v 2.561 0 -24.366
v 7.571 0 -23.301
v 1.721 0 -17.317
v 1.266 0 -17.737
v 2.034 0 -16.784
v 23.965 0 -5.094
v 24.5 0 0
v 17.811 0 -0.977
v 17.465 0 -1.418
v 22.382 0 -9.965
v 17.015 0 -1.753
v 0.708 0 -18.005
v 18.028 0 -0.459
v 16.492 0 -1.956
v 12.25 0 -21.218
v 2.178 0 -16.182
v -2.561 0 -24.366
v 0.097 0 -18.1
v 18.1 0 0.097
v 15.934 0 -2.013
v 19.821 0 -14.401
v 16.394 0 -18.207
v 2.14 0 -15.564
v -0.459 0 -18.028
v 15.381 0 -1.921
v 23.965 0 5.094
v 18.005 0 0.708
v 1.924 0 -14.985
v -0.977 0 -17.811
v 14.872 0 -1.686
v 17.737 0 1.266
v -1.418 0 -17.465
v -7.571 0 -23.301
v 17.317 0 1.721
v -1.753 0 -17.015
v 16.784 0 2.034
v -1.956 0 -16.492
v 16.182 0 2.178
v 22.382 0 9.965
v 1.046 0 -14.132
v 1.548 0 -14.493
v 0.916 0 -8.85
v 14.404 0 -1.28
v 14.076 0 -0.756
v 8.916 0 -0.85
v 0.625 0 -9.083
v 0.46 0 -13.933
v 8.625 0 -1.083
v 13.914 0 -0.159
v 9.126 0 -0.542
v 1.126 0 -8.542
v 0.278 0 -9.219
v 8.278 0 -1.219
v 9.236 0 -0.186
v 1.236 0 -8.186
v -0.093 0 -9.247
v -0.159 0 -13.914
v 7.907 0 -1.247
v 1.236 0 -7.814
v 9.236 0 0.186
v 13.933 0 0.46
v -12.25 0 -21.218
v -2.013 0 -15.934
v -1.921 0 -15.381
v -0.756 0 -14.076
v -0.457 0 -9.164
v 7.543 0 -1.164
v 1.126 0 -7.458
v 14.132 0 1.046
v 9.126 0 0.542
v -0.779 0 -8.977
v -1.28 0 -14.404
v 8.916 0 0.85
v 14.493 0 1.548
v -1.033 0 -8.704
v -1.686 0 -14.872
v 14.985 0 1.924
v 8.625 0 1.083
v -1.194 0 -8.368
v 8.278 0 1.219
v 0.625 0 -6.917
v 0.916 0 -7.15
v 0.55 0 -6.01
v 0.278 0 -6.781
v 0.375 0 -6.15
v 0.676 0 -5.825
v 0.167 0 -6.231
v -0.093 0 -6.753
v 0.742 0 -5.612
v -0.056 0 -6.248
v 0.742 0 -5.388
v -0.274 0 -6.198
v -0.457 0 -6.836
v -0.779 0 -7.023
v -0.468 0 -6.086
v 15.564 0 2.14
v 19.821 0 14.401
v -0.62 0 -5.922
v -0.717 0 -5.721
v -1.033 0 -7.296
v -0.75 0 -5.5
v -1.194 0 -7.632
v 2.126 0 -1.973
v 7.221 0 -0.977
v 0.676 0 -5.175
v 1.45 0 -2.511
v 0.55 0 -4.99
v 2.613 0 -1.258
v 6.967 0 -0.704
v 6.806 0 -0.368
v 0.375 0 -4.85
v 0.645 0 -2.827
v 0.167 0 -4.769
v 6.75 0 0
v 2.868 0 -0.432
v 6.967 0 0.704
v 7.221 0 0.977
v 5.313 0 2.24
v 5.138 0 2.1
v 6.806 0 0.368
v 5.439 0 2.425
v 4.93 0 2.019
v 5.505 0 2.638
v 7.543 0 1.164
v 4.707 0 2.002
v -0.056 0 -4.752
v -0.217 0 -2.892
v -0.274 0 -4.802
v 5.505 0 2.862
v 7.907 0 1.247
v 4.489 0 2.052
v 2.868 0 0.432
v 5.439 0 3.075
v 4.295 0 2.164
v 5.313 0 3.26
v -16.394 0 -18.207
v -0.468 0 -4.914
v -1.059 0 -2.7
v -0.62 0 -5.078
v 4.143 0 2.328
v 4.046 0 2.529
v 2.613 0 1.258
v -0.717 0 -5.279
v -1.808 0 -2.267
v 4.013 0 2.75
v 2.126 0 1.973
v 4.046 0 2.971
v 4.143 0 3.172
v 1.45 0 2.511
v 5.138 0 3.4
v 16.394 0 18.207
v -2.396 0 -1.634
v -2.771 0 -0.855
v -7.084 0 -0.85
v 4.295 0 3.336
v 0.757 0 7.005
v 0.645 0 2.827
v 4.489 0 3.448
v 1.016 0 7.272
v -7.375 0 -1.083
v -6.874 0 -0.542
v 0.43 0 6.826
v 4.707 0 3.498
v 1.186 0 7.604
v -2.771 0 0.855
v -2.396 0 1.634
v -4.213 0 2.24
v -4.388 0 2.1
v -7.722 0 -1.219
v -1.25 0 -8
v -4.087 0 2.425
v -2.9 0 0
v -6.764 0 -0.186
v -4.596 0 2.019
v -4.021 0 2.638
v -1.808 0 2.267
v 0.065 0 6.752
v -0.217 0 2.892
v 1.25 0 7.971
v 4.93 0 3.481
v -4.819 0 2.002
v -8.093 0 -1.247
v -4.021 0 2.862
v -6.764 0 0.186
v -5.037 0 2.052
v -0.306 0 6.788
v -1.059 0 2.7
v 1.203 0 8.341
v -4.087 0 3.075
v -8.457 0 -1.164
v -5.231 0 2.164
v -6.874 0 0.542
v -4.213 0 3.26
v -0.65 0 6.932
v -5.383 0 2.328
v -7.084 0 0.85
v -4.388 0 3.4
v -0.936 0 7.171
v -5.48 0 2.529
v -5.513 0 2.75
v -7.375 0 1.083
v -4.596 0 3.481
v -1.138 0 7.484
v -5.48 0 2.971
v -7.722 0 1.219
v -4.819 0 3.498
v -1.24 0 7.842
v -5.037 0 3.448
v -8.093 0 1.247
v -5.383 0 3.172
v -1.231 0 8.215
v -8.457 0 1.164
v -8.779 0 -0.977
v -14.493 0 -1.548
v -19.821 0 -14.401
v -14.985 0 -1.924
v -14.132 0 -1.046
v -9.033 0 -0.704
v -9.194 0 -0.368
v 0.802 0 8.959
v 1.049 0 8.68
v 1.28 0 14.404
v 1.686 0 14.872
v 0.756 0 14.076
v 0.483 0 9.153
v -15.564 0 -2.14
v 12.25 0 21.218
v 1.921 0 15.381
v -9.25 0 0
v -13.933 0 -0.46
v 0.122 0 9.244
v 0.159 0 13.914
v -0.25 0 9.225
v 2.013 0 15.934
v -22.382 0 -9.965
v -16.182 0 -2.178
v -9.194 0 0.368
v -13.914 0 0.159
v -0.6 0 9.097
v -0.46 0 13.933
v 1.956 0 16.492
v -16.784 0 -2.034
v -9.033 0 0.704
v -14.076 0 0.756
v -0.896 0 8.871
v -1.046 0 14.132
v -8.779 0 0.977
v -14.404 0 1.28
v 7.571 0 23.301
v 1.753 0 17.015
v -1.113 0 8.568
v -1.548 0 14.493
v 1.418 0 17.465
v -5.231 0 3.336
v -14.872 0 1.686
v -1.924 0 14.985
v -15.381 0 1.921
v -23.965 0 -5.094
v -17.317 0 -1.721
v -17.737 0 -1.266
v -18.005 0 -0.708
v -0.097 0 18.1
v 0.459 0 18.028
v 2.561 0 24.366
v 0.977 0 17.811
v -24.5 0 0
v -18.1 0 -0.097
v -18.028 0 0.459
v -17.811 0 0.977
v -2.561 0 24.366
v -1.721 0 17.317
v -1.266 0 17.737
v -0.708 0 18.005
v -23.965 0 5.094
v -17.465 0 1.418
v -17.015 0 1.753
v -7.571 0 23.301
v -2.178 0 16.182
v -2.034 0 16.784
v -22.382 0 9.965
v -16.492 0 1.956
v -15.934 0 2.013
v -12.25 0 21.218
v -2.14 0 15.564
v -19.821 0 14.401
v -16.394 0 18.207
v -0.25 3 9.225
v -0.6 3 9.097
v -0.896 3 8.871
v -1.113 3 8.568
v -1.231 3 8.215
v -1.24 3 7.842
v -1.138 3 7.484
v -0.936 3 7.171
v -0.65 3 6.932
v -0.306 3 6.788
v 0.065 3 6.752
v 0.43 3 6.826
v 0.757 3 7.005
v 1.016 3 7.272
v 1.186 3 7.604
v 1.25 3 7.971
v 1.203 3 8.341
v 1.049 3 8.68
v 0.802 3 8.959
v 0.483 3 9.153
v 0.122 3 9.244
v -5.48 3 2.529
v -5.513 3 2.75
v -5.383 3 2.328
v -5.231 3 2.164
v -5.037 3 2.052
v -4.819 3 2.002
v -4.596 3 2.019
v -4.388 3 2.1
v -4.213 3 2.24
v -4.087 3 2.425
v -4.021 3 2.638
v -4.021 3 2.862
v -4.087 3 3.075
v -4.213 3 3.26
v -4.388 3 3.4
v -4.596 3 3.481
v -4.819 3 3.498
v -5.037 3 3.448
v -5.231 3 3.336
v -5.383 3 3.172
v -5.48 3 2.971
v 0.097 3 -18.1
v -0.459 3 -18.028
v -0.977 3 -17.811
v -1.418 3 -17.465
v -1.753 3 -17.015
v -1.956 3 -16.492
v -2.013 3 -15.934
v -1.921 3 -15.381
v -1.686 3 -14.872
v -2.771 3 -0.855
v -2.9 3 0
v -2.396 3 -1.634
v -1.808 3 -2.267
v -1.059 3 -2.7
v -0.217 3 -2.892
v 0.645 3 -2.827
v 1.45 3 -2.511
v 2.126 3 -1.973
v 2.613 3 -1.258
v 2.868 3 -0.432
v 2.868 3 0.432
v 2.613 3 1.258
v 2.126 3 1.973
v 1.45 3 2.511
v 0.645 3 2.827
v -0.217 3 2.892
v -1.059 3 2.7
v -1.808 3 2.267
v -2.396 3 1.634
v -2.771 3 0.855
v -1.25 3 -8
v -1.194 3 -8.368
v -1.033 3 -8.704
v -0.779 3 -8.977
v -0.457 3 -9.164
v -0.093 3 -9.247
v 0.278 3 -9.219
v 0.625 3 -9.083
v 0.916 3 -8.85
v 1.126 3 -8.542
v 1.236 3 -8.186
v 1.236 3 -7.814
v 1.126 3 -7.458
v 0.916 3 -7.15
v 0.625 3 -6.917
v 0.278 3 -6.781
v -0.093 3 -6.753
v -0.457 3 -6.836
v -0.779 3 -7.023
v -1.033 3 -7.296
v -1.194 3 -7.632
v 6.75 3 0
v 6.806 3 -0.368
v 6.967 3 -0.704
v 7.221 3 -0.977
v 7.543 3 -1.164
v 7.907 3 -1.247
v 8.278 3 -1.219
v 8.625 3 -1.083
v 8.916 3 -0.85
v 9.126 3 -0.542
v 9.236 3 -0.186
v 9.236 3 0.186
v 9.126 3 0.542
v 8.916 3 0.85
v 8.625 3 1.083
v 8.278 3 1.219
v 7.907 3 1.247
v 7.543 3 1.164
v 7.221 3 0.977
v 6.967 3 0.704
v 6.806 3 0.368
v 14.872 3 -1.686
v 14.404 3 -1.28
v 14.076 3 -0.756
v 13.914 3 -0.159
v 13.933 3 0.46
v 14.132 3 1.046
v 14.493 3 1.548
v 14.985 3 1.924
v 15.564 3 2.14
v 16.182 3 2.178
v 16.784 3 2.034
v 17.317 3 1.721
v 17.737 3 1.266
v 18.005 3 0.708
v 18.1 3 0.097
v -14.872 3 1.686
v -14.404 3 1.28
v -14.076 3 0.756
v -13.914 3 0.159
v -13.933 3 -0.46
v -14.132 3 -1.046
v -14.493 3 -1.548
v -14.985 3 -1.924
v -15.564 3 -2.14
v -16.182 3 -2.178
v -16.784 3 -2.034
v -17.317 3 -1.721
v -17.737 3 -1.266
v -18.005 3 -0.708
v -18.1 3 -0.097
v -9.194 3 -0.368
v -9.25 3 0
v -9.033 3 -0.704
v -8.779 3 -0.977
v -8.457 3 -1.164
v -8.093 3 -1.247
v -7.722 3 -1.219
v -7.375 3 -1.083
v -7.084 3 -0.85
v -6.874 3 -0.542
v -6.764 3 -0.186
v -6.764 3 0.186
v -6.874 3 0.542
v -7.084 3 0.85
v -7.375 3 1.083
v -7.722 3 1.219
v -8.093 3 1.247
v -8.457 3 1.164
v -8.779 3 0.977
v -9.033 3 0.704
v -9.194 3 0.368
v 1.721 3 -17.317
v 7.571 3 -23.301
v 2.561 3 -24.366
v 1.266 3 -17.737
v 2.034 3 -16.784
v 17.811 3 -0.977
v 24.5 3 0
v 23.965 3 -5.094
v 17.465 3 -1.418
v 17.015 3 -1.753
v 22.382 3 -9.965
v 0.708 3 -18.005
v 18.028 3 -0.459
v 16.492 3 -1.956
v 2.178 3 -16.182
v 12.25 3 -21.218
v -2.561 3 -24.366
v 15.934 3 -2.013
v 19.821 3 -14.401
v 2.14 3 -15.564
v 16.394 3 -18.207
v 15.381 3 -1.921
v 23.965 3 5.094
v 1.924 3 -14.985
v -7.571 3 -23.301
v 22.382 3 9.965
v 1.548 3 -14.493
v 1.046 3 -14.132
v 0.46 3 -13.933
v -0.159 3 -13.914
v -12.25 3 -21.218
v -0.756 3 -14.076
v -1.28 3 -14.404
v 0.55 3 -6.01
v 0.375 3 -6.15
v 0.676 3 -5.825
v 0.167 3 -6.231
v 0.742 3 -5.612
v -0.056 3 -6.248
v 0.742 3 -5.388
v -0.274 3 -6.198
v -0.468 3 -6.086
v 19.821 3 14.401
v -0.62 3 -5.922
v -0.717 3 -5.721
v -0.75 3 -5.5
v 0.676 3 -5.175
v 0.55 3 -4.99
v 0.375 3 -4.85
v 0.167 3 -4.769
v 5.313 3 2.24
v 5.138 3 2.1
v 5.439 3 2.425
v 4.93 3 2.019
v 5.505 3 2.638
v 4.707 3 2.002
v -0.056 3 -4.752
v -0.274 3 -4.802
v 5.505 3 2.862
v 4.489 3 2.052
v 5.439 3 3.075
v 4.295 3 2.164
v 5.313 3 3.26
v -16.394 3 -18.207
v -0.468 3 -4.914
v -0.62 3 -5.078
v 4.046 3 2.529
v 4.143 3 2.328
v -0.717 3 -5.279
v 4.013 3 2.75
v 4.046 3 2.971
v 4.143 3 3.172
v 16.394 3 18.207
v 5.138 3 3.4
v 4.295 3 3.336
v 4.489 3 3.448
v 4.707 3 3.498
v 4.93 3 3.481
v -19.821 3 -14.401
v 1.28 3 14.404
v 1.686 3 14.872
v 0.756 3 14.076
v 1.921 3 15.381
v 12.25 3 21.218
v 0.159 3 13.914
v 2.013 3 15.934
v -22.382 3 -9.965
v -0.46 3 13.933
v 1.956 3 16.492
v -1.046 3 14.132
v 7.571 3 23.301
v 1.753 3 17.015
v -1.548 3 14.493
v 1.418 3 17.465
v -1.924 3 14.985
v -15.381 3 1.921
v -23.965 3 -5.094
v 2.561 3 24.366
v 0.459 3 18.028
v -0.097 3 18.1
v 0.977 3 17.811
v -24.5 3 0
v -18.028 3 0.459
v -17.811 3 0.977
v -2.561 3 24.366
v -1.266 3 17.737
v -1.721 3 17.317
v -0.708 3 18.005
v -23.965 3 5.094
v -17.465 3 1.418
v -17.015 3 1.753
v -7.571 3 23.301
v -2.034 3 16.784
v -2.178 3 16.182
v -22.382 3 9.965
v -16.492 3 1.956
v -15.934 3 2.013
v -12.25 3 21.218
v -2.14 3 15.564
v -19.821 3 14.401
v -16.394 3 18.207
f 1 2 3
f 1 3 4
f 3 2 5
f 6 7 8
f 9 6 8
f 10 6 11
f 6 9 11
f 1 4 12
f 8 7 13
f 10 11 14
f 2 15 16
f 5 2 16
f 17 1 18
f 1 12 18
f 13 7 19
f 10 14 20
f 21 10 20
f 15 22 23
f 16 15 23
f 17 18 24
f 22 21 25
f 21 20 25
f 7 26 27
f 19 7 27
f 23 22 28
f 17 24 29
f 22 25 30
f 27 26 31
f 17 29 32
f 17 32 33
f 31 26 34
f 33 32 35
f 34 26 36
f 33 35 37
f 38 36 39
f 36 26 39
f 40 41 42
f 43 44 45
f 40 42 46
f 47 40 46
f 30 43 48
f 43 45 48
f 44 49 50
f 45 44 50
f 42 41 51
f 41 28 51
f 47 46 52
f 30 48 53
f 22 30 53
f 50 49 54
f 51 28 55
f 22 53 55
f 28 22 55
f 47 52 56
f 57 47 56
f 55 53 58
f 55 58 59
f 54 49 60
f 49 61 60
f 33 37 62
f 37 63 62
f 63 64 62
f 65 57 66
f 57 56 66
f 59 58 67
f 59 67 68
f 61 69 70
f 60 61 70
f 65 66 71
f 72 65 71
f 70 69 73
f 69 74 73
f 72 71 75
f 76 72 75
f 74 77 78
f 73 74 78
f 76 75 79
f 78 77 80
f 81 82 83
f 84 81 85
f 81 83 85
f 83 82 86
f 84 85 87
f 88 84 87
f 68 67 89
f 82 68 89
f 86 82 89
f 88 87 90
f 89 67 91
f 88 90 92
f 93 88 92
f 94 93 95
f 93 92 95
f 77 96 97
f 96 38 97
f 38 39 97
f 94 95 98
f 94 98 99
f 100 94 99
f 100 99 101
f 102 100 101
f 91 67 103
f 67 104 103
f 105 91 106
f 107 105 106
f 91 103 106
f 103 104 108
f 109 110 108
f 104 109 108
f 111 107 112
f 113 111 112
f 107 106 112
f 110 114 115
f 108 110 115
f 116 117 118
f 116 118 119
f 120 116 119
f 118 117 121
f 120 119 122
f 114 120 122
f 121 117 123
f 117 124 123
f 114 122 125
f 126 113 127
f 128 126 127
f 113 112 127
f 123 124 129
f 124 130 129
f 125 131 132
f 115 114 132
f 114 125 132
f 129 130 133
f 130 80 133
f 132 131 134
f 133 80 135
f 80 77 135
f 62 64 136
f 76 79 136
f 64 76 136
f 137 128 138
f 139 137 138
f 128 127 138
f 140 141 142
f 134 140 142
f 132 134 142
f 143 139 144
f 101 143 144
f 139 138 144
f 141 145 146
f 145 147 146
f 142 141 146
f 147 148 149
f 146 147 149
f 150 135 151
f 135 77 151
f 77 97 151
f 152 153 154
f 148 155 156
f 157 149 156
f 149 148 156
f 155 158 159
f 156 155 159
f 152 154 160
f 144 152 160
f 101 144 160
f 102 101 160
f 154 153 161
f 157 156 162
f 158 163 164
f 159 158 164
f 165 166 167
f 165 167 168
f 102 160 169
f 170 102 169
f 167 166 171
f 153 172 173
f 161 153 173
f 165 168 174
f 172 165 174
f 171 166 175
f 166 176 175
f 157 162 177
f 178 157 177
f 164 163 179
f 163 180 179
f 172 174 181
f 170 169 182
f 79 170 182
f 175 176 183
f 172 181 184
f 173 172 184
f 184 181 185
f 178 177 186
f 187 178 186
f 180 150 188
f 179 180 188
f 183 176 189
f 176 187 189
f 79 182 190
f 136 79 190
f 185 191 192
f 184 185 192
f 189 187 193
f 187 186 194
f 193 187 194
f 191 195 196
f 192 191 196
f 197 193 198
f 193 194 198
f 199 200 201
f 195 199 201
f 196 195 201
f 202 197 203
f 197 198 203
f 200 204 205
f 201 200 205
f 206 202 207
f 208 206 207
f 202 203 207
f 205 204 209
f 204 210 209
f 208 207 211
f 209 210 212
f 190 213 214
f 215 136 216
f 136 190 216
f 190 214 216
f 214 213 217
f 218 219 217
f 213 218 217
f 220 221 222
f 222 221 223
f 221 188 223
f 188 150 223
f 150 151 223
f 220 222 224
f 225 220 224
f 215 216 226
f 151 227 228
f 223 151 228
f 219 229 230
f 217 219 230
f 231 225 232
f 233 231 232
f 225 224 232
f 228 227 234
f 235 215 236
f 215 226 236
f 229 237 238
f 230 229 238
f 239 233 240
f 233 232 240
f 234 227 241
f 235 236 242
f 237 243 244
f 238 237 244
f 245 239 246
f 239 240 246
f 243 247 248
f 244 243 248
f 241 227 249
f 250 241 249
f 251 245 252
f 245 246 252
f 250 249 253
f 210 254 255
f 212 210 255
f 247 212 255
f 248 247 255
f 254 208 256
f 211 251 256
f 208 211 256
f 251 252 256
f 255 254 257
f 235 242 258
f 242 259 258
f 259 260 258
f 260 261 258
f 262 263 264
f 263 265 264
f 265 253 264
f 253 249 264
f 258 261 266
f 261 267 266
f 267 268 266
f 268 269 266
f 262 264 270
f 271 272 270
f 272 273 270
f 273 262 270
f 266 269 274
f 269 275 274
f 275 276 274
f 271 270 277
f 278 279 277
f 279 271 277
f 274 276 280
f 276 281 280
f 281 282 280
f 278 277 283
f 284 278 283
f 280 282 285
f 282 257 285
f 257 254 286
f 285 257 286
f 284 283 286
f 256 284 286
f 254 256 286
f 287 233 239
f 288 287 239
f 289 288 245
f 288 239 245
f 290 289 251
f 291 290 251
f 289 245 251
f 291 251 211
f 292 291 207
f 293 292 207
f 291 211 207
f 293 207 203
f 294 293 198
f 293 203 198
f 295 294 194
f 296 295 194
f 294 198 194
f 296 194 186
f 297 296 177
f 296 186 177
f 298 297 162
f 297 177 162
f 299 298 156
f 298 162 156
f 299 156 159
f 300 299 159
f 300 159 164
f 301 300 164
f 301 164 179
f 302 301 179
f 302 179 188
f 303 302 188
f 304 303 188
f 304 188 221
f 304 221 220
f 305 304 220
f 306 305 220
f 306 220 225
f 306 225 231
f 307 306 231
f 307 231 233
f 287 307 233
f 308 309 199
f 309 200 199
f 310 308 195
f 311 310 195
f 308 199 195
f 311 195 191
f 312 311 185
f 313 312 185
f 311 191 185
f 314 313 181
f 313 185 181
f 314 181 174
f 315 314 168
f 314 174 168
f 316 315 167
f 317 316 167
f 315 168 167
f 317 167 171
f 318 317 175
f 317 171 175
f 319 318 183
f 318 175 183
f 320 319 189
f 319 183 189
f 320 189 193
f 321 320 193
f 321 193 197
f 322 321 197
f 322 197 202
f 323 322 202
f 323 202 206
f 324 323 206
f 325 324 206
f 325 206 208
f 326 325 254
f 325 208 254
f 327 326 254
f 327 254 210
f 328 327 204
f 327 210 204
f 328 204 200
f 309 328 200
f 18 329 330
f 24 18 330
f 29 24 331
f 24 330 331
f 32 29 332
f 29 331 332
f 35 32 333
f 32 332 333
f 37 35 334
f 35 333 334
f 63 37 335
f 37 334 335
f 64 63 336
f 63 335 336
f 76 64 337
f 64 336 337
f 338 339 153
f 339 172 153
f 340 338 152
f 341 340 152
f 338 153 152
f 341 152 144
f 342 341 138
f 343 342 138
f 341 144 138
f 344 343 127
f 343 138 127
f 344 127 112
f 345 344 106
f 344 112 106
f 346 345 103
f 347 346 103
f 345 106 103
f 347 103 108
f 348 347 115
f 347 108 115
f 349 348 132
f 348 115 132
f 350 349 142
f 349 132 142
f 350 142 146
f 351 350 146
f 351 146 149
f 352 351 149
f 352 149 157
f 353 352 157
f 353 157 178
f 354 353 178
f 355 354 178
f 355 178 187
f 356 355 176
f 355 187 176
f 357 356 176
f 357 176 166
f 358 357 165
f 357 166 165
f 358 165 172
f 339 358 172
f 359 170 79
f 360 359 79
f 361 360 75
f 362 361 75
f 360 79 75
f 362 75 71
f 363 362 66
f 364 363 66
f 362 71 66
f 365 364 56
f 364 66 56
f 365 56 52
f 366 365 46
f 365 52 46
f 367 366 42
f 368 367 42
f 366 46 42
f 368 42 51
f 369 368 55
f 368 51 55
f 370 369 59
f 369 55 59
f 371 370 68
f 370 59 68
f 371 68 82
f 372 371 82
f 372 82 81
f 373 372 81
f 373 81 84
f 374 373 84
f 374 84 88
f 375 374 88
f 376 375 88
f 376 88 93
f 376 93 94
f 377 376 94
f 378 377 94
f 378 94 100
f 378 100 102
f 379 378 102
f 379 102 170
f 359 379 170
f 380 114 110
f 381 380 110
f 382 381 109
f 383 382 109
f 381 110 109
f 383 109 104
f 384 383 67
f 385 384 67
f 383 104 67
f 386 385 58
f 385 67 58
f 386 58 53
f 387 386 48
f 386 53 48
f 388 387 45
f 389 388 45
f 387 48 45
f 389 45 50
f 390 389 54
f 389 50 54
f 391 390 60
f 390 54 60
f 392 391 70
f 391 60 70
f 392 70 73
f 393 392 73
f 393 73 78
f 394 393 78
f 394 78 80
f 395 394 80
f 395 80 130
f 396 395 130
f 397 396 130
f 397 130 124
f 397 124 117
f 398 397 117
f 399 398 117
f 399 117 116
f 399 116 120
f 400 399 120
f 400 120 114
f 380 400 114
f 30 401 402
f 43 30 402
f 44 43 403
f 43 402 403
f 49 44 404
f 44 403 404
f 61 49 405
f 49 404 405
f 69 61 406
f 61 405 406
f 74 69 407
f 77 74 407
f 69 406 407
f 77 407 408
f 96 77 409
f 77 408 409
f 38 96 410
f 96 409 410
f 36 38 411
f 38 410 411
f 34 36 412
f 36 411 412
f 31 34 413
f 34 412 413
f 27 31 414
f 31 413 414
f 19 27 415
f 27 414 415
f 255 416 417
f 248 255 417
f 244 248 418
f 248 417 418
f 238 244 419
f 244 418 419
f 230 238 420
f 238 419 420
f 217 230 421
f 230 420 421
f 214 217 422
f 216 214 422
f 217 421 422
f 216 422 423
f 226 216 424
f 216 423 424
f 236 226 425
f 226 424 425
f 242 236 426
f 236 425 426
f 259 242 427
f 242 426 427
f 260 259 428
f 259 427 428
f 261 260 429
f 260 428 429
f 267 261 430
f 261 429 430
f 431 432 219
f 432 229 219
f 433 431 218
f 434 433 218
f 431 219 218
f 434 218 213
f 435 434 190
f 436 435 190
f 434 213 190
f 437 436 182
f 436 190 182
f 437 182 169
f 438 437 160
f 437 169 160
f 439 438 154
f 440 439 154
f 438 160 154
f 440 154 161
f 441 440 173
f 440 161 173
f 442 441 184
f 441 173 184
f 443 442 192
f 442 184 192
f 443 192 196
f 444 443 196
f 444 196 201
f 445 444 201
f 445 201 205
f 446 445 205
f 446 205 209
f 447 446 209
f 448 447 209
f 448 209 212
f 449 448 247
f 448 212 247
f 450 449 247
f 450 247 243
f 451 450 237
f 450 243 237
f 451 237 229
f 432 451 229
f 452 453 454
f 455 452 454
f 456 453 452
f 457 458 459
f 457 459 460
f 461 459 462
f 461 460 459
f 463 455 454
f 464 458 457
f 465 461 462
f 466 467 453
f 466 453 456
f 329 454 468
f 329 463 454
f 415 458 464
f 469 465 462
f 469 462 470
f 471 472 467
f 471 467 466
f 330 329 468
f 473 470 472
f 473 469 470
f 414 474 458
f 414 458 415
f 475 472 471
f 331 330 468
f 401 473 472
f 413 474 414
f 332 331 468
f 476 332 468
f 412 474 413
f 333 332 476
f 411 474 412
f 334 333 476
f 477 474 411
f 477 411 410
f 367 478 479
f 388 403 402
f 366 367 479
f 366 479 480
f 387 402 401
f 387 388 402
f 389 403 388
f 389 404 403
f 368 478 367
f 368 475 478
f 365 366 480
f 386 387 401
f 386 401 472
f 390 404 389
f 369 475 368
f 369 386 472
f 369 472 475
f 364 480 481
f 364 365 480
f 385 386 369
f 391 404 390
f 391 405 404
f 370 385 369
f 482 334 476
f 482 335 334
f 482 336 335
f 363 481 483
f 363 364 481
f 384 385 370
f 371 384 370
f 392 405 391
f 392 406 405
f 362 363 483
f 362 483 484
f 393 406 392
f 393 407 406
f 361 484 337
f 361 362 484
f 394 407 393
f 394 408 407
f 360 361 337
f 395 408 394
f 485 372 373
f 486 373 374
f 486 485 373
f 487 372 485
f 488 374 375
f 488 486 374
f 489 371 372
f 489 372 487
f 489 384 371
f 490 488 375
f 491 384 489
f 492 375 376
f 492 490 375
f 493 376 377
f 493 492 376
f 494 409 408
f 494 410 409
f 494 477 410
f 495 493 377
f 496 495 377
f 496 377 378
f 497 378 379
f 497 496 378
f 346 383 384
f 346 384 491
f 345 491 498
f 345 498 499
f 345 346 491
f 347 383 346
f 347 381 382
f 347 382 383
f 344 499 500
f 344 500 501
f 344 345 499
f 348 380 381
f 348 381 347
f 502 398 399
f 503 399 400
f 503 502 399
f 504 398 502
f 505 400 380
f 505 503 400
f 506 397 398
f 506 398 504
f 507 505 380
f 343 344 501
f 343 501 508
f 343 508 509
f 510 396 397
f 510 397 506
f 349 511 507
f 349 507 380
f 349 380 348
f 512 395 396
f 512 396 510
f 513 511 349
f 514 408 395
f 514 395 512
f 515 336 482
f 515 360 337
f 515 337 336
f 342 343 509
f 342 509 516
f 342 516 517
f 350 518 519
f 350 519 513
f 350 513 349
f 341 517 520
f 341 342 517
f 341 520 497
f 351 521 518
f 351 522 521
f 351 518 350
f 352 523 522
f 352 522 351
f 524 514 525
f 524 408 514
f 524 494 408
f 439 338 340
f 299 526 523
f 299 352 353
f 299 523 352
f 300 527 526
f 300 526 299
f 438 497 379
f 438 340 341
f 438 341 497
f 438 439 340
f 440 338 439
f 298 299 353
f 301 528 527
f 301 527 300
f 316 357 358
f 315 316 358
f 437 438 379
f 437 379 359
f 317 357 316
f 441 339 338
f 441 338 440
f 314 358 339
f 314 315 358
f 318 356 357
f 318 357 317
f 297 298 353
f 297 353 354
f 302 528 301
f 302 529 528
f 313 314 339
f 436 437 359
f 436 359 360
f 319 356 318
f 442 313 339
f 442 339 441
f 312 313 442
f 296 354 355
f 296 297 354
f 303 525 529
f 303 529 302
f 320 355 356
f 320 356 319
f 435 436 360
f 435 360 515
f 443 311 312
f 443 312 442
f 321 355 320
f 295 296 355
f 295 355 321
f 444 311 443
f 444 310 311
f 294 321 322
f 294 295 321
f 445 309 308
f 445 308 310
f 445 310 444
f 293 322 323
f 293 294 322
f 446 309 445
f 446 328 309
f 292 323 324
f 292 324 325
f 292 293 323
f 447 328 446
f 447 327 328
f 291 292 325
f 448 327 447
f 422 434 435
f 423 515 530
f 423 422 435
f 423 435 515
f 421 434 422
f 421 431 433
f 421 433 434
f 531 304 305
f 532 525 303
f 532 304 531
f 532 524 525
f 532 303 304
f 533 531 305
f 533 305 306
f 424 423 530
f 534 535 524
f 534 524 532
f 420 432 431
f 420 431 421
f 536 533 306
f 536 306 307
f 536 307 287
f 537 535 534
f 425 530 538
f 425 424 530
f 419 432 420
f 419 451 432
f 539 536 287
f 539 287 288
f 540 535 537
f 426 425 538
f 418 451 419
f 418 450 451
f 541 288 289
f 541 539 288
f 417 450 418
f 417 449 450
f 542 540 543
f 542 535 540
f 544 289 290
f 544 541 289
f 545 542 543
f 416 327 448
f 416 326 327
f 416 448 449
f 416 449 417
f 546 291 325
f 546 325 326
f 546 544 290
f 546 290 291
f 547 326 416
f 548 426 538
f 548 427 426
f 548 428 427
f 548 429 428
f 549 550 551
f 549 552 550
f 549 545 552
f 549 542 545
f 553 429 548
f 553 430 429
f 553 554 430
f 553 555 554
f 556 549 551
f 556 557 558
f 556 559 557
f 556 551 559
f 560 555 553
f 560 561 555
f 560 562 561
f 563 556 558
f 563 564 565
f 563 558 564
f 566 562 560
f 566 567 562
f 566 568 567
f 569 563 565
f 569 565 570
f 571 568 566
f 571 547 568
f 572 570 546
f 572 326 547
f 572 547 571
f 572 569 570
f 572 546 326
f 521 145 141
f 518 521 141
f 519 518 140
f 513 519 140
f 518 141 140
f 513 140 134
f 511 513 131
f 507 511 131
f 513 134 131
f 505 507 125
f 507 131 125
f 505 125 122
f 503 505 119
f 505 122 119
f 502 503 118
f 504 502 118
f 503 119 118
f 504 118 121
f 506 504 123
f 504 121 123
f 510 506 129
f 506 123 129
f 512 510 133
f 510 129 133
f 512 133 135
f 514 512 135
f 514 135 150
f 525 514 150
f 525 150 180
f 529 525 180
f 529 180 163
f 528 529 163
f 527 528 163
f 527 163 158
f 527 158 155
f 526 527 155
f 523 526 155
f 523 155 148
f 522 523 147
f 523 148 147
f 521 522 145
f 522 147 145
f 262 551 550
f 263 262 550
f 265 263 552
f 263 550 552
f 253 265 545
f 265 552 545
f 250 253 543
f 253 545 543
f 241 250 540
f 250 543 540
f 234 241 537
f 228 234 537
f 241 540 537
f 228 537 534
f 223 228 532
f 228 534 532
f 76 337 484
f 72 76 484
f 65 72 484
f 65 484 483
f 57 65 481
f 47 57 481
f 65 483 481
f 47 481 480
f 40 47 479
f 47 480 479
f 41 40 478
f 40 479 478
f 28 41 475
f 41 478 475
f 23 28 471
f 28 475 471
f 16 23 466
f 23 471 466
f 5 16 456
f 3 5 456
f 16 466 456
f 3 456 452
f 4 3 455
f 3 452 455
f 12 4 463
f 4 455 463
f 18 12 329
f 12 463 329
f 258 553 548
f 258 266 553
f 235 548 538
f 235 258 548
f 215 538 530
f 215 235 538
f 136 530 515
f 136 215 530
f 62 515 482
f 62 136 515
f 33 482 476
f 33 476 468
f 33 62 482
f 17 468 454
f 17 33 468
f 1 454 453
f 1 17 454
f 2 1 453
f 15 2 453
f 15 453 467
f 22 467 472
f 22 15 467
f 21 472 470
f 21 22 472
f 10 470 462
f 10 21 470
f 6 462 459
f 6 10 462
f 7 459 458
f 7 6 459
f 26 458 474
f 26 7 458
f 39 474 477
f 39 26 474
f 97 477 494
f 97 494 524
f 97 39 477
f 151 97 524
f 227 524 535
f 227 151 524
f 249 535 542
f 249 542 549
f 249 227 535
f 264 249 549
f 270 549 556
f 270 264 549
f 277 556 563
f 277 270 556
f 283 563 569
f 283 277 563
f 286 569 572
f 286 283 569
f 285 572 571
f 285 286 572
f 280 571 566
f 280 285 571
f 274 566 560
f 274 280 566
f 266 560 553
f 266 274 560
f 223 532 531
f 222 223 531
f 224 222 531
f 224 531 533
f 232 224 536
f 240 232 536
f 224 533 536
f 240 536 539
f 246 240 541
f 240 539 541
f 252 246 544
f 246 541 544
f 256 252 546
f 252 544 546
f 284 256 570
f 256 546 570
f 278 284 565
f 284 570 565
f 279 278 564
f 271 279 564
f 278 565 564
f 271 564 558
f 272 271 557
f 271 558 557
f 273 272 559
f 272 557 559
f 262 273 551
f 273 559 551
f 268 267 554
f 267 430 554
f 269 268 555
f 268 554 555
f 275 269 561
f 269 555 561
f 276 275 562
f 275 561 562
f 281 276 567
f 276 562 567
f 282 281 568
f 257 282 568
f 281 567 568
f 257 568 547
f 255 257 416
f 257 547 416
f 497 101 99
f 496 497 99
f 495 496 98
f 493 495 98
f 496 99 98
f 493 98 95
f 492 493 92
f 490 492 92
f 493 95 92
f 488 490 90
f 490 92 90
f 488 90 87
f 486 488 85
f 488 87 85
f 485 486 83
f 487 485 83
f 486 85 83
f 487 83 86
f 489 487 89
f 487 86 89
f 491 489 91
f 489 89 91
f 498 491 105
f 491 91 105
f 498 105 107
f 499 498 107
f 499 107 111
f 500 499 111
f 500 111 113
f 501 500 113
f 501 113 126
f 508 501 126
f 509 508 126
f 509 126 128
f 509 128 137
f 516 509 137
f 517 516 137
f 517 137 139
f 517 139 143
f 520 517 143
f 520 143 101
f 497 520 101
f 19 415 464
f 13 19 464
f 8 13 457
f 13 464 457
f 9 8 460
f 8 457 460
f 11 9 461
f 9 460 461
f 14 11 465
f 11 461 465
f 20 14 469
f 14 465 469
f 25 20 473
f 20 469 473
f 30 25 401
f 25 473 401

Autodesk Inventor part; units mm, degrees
ref_plane "YZ Plane" through (0, 0, 0) normal (1, 0, 0) x (0, 1, 0)
ref_plane "XZ Plane" through (0, 0, 0) normal (0, 1, 0) x (-1, 0, 0)
ref_plane "XY Plane" through (0, 0, 0) normal (0, 0, 1) x (1, 0, 0)
sketch "Эскиз1" plane through (0, 0, 0) normal (0, 1, 0) x (-1, 0, 0)
  arc A0 (-0.25, 9.2247) -> (0.25, 9.2247) centre (0, 8) ccw
  line L0 (-0.25, 10.9972) -> (-0.25, 9.2247)
  arc A1 (-0.25, 10.9972) -> (-1.1469, -10.94) centre (0, 0) ccw
  line L1 (-1.1469, -10.6297) -> (-1.1469, -10.94)
  line L2 (-0.8473, -10.6297) -> (-1.1469, -10.6297)
  line L3 (-0.8473, -10.9673) -> (-0.8473, -10.6297)
  arc A2 (-0.8473, -10.9673) -> (0.8535, -10.9668) centre (0, 0) ccw
  line L4 (0.8535, -10.6297) -> (0.8535, -10.9668)
  line L5 (1.1541, -10.6297) -> (0.8535, -10.6297)
  line L6 (1.1541, -10.9393) -> (1.1541, -10.6297)
  arc A3 (1.1541, -10.9393) -> (0.25, 10.9972) centre (0, 0) ccw
  line L7 (0.25, 9.2247) -> (0.25, 10.9972)
  circle A4 centre (8, 0) radius 1.25
  circle A5 centre (0, -8) radius 1.25
  circle A6 centre (-8, 0) radius 1.25
  circle A7 centre (0, -5.5) radius 0.75
  circle A8 centre (4.7631, 2.75) radius 0.75
  circle A9 centre (-4.7631, 2.75) radius 0.75
  circle A10 centre (0, 0) radius 2.9
  arc A11 (0.25, 9.2247) -> (-0.25, 9.2247) centre (0, 8) ccw
  circle A12 centre (0, 0) radius 22.5
  point P0 (0, 0)
  dimension "d8" = 45
extrude "Выдавливание1" add sketch "Эскиз1" along normal blind 3 contours A0 L7 A3 L6 L5 L4 A2 L3 L2 L1 A1 L0 | A12
sketch "Эскиз2" plane through (0, 3, 0) normal (0, 1, 0) x (1, 0, 0)
  arc A0 (-14.8717, -1.6857) -> (-18.0997, 0.0968) centre (-15.9998, 0.0856) ccw
  arc A1 (-6.8718, -1.7285) -> (-9.1468, -1.7163) centre (-7.9999, 0.0428) ccw
  circle A2 centre (0, 0) radius 4
  arc A3 (-1.7285, 6.8718) -> (-1.7163, 9.1468) centre (0.0428, 7.9999) ccw
  arc A4 (-1.6857, 14.8717) -> (0.0968, 18.0997) centre (0.0856, 15.9998) ccw
  arc A5 (6.8718, 1.7285) -> (9.1468, 1.7163) centre (7.9999, -0.0428) ccw
  arc A6 (14.8717, 1.6857) -> (18.0997, -0.0968) centre (15.9998, -0.0856) ccw
  arc A7 (1.7285, -6.8718) -> (1.7163, -9.1468) centre (-0.0428, -7.9999) ccw
  arc A8 (1.6857, -14.8717) -> (-0.0968, -18.0997) centre (-0.0856, -15.9998) ccw
  circle A9 centre (-15.9998, 0.0856) radius 2.1
  circle A10 centre (-7.9999, 0.0428) radius 2.1
  circle A11 centre (0, 0) radius 4
  circle A12 centre (0.0428, 7.9999) radius 2.1
  circle A13 centre (0.0856, 15.9998) radius 2.1
  circle A14 centre (7.9999, -0.0428) radius 2.1
  circle A15 centre (15.9998, -0.0856) radius 2.1
  circle A16 centre (-0.0428, -7.9999) radius 2.1
  circle A17 centre (-0.0856, -15.9998) radius 2.1
  dimension "d4" = 4.2
extrude "Выдавливание2" cut sketch "Эскиз2" against normal blind 10 contours A9 A0 | A13 A4 | A15 A6 | A17 A8
offset faces "Размер1" outward 2 faces at (-22.427, 2, -1.8105)
sketch "Эскиз3" plane through (0, 3, 0) normal (0, 1, 0) x (1, 0, 0)
  circle A0 centre (15.9998, -0.0856) radius 2.1 projected
  circle A1 centre (-15.9998, 0.0856) radius 2.1 projected
  circle A2 centre (0.0856, 15.9998) radius 2.1 projected
  circle A3 centre (-0.0856, -15.9998) radius 2.1 projected
  circle A4 centre (0, 0) radius 2.9 projected
  circle A5 centre (8, 0) radius 1.25 projected
  circle A6 centre (0, 8) radius 1.25 projected
  circle A7 centre (-8, 0) radius 1.25 projected
  circle A8 centre (4.7631, -2.75) radius 0.75 projected
  circle A9 centre (-4.7631, -2.75) radius 0.75 projected
  circle A10 centre (0, 5.5) radius 0.75 projected
  circle A11 centre (0, -8) radius 1.25 projected
  circle A12 centre (0, 0) radius 24.5 projected
properties part number "КВ33.044.405 -  Боковина шкива"
